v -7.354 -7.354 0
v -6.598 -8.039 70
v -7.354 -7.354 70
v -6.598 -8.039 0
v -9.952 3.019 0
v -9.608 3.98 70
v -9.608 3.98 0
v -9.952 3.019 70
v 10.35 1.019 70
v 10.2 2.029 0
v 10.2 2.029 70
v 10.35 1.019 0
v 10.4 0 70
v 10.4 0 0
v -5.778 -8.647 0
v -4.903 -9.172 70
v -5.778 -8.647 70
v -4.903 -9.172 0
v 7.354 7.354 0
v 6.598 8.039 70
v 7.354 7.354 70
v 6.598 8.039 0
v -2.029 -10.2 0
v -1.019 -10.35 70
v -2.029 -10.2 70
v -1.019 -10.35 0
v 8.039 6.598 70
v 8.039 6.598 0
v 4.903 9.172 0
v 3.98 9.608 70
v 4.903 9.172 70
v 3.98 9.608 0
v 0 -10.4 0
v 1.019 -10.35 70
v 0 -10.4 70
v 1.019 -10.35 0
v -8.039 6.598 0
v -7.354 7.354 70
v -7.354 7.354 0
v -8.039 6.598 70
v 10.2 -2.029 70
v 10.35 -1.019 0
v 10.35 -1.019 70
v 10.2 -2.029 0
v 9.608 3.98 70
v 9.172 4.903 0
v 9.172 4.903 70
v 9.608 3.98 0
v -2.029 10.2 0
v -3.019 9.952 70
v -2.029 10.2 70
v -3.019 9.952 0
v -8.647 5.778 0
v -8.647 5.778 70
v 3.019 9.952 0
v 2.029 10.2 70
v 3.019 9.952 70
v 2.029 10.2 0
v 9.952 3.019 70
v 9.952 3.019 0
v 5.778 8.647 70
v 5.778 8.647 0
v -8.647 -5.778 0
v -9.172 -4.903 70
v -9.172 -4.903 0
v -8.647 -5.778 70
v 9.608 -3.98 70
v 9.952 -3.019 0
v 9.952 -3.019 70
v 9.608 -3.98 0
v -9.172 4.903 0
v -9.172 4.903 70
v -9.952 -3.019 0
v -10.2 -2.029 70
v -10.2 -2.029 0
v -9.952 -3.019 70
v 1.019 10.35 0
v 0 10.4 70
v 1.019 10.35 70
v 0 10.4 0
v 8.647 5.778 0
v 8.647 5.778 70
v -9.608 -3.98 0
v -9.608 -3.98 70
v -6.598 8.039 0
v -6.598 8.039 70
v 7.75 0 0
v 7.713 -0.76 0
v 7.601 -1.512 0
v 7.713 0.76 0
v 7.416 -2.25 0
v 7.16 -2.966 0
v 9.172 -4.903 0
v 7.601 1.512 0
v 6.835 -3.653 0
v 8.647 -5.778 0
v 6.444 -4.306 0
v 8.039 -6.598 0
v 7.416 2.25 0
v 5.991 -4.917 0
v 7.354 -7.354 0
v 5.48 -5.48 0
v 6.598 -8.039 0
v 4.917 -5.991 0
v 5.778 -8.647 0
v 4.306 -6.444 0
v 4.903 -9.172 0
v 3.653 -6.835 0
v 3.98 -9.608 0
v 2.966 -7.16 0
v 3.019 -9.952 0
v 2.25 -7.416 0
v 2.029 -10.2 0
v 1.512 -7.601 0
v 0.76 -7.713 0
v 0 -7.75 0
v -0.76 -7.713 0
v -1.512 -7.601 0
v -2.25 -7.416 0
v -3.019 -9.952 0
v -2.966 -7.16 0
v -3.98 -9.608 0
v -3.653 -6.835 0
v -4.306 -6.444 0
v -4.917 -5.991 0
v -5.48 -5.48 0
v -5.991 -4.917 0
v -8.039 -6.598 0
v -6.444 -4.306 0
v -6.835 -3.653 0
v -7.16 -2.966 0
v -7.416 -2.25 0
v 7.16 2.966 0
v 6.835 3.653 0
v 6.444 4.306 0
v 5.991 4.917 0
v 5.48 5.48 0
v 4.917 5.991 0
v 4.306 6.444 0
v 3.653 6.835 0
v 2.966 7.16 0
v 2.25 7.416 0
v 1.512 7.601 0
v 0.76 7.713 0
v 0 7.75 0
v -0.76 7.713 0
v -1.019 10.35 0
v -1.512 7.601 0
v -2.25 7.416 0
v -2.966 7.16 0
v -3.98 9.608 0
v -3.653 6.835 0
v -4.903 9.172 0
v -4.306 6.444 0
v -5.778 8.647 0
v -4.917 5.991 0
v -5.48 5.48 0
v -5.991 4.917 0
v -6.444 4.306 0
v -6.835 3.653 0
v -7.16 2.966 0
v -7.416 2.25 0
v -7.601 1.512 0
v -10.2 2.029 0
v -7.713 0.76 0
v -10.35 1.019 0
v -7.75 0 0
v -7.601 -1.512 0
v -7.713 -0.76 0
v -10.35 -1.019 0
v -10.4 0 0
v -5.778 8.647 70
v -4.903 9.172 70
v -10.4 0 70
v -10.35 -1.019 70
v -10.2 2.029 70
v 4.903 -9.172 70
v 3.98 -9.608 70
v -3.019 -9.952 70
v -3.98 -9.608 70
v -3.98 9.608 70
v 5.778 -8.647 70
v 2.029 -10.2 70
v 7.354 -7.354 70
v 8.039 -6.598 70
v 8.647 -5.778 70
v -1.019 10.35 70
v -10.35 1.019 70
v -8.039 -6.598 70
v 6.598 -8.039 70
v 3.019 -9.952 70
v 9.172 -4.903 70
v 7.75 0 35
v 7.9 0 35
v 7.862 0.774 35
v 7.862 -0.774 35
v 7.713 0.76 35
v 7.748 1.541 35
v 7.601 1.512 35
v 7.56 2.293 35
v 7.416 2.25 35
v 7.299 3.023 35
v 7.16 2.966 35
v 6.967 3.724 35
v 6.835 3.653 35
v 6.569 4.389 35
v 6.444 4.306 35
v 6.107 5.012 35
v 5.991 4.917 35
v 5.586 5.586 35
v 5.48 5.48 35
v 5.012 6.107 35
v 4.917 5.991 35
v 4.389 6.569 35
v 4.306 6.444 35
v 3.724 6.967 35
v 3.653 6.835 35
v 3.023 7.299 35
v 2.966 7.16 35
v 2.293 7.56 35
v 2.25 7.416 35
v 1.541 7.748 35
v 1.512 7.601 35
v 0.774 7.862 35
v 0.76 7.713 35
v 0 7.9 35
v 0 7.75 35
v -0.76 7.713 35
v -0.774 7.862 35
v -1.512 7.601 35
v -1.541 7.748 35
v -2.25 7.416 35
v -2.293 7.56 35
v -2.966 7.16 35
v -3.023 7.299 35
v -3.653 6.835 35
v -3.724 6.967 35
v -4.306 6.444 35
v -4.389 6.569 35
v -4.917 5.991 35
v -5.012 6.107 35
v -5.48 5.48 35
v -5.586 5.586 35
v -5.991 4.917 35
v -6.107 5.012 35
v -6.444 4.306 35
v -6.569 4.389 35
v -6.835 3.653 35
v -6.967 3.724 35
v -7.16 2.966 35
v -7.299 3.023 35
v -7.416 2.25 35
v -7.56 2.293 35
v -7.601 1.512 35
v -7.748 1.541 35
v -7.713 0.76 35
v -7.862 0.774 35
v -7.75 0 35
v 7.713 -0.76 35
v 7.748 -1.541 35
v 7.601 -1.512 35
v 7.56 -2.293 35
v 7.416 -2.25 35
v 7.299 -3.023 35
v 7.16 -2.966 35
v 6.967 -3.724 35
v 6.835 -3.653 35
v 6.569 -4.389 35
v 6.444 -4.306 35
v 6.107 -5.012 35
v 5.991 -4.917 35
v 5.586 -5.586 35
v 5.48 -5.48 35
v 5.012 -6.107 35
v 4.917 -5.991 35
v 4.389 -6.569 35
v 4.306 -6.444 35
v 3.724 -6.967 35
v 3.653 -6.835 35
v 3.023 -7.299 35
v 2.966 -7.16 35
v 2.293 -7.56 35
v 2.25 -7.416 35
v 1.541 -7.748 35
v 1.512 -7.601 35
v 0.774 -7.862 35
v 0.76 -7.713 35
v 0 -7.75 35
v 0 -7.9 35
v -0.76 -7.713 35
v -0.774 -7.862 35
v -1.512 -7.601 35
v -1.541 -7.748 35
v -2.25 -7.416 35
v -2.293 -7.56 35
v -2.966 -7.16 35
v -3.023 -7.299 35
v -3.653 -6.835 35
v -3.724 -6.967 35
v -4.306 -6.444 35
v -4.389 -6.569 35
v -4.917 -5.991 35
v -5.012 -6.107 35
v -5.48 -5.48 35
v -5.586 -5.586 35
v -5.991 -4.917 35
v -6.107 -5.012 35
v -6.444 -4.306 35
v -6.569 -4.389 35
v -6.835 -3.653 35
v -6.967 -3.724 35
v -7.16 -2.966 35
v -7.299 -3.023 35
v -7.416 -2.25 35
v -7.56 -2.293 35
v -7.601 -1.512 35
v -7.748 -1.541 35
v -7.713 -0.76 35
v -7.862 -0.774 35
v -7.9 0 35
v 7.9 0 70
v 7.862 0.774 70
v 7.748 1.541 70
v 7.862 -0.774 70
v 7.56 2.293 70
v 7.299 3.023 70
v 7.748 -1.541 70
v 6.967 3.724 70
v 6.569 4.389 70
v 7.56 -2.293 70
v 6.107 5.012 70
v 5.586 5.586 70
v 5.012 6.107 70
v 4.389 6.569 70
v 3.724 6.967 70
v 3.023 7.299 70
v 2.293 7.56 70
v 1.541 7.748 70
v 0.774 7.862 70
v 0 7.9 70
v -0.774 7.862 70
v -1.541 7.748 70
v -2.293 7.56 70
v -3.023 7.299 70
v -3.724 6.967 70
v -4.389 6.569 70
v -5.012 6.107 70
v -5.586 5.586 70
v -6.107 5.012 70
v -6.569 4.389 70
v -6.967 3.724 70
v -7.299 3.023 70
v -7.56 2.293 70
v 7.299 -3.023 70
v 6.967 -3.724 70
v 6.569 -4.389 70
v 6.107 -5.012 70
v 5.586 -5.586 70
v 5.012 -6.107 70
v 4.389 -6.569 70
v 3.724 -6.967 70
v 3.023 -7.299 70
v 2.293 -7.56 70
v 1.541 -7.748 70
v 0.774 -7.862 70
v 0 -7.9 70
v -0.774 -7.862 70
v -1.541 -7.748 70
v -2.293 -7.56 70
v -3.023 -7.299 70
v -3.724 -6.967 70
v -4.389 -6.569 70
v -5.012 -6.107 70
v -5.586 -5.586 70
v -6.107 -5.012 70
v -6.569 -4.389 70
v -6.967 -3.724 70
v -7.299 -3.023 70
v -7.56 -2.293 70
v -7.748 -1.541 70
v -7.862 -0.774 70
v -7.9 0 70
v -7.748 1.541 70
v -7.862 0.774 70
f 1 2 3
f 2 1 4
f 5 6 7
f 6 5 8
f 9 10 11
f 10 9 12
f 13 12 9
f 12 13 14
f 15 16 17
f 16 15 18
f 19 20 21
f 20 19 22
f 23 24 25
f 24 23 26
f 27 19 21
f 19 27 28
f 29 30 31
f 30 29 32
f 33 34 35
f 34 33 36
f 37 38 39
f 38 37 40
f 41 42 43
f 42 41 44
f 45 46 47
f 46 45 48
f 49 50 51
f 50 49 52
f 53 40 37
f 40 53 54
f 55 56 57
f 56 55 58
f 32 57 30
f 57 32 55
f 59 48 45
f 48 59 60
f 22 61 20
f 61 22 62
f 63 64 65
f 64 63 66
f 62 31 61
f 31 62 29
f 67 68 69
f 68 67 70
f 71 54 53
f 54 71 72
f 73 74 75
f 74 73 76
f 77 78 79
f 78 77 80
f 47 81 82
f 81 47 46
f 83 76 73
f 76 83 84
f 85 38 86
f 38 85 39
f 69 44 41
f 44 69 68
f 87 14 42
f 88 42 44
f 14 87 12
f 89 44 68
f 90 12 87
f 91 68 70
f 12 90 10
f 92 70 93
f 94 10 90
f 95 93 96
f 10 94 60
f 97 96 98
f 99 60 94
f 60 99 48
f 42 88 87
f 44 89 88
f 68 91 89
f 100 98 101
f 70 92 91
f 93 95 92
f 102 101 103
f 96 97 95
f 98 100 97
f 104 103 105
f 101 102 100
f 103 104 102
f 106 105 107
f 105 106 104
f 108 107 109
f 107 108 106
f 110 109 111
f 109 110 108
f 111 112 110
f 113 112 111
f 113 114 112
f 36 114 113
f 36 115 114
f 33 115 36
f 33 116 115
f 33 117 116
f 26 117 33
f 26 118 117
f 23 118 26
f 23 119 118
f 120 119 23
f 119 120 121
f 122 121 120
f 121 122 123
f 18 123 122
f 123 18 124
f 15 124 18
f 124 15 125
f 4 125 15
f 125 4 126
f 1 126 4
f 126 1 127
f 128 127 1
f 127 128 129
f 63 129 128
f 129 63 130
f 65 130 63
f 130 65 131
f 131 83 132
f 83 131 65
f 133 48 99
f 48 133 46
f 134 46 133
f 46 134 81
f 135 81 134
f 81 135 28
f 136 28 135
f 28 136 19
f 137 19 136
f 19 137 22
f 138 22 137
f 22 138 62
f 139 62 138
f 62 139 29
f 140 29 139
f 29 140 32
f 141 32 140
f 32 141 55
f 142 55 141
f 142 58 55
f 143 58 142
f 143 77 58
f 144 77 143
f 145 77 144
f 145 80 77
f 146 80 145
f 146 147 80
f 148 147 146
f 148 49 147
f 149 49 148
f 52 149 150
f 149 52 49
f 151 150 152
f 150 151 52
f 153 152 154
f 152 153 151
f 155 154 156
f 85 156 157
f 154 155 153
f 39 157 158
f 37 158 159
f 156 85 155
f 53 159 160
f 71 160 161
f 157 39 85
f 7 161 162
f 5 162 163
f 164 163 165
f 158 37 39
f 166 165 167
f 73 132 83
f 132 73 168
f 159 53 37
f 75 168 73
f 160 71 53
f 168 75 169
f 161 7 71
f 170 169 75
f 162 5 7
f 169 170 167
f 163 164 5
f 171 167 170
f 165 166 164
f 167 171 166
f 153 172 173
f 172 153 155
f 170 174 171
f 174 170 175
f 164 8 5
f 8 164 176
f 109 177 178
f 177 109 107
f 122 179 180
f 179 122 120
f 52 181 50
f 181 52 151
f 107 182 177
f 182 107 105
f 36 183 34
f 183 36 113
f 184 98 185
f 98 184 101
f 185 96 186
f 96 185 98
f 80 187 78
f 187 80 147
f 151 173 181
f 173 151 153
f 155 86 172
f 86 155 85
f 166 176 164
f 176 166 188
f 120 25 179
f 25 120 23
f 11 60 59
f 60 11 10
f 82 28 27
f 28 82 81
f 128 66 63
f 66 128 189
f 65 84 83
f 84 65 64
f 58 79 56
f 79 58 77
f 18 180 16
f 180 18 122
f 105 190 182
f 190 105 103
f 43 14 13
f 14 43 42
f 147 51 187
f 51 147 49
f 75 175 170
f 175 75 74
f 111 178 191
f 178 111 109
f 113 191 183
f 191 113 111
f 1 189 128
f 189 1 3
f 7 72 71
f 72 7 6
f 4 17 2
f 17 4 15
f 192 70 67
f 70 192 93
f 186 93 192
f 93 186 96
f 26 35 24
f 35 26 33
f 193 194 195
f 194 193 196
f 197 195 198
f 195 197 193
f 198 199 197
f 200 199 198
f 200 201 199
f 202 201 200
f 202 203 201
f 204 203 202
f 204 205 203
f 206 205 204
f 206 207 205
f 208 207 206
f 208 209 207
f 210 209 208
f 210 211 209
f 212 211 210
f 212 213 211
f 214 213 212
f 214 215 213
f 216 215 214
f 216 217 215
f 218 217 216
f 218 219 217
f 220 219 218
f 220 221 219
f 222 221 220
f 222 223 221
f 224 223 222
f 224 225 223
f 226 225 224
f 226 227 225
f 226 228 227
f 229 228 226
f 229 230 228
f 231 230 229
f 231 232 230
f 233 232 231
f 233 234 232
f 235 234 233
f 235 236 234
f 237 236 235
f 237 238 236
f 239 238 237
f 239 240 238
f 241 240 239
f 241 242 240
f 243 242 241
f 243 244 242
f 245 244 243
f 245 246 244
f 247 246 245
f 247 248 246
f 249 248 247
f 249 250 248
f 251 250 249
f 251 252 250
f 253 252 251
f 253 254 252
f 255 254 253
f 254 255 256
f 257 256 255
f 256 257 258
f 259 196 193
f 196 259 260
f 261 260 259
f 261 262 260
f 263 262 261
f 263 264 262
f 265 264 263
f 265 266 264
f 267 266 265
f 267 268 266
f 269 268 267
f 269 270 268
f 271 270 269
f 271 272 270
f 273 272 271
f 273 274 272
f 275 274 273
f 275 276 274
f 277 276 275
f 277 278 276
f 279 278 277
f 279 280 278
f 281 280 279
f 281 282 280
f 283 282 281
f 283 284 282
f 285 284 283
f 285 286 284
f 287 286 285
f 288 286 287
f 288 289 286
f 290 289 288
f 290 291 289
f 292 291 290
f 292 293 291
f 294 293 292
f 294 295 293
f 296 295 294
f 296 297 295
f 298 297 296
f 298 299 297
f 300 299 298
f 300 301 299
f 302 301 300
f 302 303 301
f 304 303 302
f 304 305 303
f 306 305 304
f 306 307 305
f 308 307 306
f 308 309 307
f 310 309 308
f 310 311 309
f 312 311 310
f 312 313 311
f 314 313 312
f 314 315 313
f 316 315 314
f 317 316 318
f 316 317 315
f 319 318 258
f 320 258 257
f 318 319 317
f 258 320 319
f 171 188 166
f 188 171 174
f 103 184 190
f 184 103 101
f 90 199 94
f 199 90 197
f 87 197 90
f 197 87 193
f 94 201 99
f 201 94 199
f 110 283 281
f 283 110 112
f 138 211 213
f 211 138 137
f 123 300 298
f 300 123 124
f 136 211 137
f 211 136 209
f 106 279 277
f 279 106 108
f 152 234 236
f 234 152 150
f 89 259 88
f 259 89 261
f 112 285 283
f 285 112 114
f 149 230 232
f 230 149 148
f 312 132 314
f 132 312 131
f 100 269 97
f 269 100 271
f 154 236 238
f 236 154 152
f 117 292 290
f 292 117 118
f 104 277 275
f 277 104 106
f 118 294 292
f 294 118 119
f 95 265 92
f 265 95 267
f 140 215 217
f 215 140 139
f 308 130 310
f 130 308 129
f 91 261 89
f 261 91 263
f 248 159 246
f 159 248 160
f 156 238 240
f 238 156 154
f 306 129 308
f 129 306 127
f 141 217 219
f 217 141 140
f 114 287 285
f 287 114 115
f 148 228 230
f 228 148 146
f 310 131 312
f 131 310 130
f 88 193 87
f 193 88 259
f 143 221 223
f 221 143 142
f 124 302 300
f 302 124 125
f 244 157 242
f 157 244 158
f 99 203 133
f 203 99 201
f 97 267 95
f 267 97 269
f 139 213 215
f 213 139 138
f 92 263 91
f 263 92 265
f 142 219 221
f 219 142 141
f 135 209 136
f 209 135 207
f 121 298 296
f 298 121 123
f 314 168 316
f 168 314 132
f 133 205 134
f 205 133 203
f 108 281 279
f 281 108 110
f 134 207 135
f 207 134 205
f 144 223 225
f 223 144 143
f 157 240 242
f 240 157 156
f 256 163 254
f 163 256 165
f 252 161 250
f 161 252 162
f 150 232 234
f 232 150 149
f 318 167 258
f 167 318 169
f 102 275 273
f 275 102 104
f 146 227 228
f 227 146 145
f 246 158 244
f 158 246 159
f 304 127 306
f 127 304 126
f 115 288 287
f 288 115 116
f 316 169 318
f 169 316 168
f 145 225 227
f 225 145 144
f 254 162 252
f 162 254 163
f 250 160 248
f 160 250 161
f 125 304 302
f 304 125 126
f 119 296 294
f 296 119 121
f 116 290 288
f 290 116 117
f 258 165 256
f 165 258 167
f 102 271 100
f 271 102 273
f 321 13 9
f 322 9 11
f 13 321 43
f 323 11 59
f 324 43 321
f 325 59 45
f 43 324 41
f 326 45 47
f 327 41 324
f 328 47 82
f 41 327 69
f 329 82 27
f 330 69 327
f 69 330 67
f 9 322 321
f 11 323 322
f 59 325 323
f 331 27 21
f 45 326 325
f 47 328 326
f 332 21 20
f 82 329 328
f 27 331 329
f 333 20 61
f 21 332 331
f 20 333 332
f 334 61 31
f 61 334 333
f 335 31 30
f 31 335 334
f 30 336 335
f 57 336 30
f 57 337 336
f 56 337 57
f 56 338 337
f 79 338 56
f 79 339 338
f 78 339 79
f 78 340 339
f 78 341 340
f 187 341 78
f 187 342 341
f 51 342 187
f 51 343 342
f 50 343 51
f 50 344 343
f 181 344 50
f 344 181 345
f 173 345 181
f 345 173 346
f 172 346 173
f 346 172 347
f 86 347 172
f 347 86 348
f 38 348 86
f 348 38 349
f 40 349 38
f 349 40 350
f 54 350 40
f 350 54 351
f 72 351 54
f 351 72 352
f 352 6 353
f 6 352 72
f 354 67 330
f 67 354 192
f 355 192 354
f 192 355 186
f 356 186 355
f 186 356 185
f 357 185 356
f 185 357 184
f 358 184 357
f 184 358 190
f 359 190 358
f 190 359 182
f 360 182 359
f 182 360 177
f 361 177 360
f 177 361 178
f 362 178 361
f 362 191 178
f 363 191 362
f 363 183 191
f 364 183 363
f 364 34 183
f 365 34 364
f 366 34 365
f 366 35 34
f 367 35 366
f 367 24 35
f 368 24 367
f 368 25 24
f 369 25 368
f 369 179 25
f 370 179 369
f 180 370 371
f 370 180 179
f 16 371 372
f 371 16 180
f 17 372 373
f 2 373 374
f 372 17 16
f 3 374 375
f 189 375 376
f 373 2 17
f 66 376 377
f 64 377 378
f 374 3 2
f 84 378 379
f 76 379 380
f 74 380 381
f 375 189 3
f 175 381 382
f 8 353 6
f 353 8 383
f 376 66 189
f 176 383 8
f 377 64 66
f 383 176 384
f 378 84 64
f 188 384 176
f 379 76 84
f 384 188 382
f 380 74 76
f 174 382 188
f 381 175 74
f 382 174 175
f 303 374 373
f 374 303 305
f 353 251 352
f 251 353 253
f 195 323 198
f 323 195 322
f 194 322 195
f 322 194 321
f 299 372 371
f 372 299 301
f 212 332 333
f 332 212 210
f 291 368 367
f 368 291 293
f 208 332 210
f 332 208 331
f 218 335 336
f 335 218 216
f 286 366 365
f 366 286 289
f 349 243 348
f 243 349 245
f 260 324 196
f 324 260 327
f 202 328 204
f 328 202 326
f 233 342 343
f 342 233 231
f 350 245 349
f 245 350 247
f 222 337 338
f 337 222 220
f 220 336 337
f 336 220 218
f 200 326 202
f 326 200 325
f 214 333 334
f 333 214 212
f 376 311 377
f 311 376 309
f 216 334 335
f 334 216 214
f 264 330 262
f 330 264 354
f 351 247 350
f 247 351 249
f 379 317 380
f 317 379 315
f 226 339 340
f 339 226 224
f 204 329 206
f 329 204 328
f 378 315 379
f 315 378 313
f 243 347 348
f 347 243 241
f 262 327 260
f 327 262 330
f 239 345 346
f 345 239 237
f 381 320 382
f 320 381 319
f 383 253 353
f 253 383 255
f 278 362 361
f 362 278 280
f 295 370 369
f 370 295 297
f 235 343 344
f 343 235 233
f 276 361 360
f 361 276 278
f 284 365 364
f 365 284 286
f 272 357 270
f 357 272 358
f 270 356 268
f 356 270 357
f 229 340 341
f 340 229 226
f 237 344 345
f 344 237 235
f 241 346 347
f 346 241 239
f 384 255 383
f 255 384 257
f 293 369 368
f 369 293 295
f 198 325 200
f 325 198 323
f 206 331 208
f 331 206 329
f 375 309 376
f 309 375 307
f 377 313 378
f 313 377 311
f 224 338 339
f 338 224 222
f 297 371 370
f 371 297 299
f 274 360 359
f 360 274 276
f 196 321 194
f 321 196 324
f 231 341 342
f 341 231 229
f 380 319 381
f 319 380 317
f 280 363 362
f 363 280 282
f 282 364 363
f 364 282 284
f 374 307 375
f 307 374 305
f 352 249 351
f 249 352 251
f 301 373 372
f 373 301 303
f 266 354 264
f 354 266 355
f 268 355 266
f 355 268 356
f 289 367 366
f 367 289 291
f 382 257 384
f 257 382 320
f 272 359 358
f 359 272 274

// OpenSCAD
$fn = 64;

// Side A (Dryer - Top)
hose_a_target_od = 15.2;
hose_a_shrinkage_comp = 0.6; // adjusted from 1.0 based on test print
hose_a_id = hose_a_target_od + hose_a_shrinkage_comp;
hose_a_depth = 35.0;

// Side B (Washer - Bottom)
hose_b_target_od = 14.5;
hose_b_shrinkage_comp = 1.0;
hose_b_id = hose_b_target_od + hose_b_shrinkage_comp;
hose_b_depth = 35.0;

wall_thickness = 2.5;
max_id = max(hose_a_id, hose_b_id);
adapter_od = max_id + (wall_thickness * 2);

module drain_adapter() {
  union() {
    difference() {
      cylinder(d = adapter_od, h = hose_b_depth);
      translate([0, 0, -0.1])
        cylinder(d = hose_b_id, h = hose_b_depth + 0.2);
    }

    translate([0, 0, hose_b_depth])
    difference() {
      cylinder(d = adapter_od, h = hose_a_depth);
      translate([0, 0, -0.1])
        cylinder(d = hose_a_id, h = hose_a_depth + 0.2);
    }
  }
}

drain_adapter();
